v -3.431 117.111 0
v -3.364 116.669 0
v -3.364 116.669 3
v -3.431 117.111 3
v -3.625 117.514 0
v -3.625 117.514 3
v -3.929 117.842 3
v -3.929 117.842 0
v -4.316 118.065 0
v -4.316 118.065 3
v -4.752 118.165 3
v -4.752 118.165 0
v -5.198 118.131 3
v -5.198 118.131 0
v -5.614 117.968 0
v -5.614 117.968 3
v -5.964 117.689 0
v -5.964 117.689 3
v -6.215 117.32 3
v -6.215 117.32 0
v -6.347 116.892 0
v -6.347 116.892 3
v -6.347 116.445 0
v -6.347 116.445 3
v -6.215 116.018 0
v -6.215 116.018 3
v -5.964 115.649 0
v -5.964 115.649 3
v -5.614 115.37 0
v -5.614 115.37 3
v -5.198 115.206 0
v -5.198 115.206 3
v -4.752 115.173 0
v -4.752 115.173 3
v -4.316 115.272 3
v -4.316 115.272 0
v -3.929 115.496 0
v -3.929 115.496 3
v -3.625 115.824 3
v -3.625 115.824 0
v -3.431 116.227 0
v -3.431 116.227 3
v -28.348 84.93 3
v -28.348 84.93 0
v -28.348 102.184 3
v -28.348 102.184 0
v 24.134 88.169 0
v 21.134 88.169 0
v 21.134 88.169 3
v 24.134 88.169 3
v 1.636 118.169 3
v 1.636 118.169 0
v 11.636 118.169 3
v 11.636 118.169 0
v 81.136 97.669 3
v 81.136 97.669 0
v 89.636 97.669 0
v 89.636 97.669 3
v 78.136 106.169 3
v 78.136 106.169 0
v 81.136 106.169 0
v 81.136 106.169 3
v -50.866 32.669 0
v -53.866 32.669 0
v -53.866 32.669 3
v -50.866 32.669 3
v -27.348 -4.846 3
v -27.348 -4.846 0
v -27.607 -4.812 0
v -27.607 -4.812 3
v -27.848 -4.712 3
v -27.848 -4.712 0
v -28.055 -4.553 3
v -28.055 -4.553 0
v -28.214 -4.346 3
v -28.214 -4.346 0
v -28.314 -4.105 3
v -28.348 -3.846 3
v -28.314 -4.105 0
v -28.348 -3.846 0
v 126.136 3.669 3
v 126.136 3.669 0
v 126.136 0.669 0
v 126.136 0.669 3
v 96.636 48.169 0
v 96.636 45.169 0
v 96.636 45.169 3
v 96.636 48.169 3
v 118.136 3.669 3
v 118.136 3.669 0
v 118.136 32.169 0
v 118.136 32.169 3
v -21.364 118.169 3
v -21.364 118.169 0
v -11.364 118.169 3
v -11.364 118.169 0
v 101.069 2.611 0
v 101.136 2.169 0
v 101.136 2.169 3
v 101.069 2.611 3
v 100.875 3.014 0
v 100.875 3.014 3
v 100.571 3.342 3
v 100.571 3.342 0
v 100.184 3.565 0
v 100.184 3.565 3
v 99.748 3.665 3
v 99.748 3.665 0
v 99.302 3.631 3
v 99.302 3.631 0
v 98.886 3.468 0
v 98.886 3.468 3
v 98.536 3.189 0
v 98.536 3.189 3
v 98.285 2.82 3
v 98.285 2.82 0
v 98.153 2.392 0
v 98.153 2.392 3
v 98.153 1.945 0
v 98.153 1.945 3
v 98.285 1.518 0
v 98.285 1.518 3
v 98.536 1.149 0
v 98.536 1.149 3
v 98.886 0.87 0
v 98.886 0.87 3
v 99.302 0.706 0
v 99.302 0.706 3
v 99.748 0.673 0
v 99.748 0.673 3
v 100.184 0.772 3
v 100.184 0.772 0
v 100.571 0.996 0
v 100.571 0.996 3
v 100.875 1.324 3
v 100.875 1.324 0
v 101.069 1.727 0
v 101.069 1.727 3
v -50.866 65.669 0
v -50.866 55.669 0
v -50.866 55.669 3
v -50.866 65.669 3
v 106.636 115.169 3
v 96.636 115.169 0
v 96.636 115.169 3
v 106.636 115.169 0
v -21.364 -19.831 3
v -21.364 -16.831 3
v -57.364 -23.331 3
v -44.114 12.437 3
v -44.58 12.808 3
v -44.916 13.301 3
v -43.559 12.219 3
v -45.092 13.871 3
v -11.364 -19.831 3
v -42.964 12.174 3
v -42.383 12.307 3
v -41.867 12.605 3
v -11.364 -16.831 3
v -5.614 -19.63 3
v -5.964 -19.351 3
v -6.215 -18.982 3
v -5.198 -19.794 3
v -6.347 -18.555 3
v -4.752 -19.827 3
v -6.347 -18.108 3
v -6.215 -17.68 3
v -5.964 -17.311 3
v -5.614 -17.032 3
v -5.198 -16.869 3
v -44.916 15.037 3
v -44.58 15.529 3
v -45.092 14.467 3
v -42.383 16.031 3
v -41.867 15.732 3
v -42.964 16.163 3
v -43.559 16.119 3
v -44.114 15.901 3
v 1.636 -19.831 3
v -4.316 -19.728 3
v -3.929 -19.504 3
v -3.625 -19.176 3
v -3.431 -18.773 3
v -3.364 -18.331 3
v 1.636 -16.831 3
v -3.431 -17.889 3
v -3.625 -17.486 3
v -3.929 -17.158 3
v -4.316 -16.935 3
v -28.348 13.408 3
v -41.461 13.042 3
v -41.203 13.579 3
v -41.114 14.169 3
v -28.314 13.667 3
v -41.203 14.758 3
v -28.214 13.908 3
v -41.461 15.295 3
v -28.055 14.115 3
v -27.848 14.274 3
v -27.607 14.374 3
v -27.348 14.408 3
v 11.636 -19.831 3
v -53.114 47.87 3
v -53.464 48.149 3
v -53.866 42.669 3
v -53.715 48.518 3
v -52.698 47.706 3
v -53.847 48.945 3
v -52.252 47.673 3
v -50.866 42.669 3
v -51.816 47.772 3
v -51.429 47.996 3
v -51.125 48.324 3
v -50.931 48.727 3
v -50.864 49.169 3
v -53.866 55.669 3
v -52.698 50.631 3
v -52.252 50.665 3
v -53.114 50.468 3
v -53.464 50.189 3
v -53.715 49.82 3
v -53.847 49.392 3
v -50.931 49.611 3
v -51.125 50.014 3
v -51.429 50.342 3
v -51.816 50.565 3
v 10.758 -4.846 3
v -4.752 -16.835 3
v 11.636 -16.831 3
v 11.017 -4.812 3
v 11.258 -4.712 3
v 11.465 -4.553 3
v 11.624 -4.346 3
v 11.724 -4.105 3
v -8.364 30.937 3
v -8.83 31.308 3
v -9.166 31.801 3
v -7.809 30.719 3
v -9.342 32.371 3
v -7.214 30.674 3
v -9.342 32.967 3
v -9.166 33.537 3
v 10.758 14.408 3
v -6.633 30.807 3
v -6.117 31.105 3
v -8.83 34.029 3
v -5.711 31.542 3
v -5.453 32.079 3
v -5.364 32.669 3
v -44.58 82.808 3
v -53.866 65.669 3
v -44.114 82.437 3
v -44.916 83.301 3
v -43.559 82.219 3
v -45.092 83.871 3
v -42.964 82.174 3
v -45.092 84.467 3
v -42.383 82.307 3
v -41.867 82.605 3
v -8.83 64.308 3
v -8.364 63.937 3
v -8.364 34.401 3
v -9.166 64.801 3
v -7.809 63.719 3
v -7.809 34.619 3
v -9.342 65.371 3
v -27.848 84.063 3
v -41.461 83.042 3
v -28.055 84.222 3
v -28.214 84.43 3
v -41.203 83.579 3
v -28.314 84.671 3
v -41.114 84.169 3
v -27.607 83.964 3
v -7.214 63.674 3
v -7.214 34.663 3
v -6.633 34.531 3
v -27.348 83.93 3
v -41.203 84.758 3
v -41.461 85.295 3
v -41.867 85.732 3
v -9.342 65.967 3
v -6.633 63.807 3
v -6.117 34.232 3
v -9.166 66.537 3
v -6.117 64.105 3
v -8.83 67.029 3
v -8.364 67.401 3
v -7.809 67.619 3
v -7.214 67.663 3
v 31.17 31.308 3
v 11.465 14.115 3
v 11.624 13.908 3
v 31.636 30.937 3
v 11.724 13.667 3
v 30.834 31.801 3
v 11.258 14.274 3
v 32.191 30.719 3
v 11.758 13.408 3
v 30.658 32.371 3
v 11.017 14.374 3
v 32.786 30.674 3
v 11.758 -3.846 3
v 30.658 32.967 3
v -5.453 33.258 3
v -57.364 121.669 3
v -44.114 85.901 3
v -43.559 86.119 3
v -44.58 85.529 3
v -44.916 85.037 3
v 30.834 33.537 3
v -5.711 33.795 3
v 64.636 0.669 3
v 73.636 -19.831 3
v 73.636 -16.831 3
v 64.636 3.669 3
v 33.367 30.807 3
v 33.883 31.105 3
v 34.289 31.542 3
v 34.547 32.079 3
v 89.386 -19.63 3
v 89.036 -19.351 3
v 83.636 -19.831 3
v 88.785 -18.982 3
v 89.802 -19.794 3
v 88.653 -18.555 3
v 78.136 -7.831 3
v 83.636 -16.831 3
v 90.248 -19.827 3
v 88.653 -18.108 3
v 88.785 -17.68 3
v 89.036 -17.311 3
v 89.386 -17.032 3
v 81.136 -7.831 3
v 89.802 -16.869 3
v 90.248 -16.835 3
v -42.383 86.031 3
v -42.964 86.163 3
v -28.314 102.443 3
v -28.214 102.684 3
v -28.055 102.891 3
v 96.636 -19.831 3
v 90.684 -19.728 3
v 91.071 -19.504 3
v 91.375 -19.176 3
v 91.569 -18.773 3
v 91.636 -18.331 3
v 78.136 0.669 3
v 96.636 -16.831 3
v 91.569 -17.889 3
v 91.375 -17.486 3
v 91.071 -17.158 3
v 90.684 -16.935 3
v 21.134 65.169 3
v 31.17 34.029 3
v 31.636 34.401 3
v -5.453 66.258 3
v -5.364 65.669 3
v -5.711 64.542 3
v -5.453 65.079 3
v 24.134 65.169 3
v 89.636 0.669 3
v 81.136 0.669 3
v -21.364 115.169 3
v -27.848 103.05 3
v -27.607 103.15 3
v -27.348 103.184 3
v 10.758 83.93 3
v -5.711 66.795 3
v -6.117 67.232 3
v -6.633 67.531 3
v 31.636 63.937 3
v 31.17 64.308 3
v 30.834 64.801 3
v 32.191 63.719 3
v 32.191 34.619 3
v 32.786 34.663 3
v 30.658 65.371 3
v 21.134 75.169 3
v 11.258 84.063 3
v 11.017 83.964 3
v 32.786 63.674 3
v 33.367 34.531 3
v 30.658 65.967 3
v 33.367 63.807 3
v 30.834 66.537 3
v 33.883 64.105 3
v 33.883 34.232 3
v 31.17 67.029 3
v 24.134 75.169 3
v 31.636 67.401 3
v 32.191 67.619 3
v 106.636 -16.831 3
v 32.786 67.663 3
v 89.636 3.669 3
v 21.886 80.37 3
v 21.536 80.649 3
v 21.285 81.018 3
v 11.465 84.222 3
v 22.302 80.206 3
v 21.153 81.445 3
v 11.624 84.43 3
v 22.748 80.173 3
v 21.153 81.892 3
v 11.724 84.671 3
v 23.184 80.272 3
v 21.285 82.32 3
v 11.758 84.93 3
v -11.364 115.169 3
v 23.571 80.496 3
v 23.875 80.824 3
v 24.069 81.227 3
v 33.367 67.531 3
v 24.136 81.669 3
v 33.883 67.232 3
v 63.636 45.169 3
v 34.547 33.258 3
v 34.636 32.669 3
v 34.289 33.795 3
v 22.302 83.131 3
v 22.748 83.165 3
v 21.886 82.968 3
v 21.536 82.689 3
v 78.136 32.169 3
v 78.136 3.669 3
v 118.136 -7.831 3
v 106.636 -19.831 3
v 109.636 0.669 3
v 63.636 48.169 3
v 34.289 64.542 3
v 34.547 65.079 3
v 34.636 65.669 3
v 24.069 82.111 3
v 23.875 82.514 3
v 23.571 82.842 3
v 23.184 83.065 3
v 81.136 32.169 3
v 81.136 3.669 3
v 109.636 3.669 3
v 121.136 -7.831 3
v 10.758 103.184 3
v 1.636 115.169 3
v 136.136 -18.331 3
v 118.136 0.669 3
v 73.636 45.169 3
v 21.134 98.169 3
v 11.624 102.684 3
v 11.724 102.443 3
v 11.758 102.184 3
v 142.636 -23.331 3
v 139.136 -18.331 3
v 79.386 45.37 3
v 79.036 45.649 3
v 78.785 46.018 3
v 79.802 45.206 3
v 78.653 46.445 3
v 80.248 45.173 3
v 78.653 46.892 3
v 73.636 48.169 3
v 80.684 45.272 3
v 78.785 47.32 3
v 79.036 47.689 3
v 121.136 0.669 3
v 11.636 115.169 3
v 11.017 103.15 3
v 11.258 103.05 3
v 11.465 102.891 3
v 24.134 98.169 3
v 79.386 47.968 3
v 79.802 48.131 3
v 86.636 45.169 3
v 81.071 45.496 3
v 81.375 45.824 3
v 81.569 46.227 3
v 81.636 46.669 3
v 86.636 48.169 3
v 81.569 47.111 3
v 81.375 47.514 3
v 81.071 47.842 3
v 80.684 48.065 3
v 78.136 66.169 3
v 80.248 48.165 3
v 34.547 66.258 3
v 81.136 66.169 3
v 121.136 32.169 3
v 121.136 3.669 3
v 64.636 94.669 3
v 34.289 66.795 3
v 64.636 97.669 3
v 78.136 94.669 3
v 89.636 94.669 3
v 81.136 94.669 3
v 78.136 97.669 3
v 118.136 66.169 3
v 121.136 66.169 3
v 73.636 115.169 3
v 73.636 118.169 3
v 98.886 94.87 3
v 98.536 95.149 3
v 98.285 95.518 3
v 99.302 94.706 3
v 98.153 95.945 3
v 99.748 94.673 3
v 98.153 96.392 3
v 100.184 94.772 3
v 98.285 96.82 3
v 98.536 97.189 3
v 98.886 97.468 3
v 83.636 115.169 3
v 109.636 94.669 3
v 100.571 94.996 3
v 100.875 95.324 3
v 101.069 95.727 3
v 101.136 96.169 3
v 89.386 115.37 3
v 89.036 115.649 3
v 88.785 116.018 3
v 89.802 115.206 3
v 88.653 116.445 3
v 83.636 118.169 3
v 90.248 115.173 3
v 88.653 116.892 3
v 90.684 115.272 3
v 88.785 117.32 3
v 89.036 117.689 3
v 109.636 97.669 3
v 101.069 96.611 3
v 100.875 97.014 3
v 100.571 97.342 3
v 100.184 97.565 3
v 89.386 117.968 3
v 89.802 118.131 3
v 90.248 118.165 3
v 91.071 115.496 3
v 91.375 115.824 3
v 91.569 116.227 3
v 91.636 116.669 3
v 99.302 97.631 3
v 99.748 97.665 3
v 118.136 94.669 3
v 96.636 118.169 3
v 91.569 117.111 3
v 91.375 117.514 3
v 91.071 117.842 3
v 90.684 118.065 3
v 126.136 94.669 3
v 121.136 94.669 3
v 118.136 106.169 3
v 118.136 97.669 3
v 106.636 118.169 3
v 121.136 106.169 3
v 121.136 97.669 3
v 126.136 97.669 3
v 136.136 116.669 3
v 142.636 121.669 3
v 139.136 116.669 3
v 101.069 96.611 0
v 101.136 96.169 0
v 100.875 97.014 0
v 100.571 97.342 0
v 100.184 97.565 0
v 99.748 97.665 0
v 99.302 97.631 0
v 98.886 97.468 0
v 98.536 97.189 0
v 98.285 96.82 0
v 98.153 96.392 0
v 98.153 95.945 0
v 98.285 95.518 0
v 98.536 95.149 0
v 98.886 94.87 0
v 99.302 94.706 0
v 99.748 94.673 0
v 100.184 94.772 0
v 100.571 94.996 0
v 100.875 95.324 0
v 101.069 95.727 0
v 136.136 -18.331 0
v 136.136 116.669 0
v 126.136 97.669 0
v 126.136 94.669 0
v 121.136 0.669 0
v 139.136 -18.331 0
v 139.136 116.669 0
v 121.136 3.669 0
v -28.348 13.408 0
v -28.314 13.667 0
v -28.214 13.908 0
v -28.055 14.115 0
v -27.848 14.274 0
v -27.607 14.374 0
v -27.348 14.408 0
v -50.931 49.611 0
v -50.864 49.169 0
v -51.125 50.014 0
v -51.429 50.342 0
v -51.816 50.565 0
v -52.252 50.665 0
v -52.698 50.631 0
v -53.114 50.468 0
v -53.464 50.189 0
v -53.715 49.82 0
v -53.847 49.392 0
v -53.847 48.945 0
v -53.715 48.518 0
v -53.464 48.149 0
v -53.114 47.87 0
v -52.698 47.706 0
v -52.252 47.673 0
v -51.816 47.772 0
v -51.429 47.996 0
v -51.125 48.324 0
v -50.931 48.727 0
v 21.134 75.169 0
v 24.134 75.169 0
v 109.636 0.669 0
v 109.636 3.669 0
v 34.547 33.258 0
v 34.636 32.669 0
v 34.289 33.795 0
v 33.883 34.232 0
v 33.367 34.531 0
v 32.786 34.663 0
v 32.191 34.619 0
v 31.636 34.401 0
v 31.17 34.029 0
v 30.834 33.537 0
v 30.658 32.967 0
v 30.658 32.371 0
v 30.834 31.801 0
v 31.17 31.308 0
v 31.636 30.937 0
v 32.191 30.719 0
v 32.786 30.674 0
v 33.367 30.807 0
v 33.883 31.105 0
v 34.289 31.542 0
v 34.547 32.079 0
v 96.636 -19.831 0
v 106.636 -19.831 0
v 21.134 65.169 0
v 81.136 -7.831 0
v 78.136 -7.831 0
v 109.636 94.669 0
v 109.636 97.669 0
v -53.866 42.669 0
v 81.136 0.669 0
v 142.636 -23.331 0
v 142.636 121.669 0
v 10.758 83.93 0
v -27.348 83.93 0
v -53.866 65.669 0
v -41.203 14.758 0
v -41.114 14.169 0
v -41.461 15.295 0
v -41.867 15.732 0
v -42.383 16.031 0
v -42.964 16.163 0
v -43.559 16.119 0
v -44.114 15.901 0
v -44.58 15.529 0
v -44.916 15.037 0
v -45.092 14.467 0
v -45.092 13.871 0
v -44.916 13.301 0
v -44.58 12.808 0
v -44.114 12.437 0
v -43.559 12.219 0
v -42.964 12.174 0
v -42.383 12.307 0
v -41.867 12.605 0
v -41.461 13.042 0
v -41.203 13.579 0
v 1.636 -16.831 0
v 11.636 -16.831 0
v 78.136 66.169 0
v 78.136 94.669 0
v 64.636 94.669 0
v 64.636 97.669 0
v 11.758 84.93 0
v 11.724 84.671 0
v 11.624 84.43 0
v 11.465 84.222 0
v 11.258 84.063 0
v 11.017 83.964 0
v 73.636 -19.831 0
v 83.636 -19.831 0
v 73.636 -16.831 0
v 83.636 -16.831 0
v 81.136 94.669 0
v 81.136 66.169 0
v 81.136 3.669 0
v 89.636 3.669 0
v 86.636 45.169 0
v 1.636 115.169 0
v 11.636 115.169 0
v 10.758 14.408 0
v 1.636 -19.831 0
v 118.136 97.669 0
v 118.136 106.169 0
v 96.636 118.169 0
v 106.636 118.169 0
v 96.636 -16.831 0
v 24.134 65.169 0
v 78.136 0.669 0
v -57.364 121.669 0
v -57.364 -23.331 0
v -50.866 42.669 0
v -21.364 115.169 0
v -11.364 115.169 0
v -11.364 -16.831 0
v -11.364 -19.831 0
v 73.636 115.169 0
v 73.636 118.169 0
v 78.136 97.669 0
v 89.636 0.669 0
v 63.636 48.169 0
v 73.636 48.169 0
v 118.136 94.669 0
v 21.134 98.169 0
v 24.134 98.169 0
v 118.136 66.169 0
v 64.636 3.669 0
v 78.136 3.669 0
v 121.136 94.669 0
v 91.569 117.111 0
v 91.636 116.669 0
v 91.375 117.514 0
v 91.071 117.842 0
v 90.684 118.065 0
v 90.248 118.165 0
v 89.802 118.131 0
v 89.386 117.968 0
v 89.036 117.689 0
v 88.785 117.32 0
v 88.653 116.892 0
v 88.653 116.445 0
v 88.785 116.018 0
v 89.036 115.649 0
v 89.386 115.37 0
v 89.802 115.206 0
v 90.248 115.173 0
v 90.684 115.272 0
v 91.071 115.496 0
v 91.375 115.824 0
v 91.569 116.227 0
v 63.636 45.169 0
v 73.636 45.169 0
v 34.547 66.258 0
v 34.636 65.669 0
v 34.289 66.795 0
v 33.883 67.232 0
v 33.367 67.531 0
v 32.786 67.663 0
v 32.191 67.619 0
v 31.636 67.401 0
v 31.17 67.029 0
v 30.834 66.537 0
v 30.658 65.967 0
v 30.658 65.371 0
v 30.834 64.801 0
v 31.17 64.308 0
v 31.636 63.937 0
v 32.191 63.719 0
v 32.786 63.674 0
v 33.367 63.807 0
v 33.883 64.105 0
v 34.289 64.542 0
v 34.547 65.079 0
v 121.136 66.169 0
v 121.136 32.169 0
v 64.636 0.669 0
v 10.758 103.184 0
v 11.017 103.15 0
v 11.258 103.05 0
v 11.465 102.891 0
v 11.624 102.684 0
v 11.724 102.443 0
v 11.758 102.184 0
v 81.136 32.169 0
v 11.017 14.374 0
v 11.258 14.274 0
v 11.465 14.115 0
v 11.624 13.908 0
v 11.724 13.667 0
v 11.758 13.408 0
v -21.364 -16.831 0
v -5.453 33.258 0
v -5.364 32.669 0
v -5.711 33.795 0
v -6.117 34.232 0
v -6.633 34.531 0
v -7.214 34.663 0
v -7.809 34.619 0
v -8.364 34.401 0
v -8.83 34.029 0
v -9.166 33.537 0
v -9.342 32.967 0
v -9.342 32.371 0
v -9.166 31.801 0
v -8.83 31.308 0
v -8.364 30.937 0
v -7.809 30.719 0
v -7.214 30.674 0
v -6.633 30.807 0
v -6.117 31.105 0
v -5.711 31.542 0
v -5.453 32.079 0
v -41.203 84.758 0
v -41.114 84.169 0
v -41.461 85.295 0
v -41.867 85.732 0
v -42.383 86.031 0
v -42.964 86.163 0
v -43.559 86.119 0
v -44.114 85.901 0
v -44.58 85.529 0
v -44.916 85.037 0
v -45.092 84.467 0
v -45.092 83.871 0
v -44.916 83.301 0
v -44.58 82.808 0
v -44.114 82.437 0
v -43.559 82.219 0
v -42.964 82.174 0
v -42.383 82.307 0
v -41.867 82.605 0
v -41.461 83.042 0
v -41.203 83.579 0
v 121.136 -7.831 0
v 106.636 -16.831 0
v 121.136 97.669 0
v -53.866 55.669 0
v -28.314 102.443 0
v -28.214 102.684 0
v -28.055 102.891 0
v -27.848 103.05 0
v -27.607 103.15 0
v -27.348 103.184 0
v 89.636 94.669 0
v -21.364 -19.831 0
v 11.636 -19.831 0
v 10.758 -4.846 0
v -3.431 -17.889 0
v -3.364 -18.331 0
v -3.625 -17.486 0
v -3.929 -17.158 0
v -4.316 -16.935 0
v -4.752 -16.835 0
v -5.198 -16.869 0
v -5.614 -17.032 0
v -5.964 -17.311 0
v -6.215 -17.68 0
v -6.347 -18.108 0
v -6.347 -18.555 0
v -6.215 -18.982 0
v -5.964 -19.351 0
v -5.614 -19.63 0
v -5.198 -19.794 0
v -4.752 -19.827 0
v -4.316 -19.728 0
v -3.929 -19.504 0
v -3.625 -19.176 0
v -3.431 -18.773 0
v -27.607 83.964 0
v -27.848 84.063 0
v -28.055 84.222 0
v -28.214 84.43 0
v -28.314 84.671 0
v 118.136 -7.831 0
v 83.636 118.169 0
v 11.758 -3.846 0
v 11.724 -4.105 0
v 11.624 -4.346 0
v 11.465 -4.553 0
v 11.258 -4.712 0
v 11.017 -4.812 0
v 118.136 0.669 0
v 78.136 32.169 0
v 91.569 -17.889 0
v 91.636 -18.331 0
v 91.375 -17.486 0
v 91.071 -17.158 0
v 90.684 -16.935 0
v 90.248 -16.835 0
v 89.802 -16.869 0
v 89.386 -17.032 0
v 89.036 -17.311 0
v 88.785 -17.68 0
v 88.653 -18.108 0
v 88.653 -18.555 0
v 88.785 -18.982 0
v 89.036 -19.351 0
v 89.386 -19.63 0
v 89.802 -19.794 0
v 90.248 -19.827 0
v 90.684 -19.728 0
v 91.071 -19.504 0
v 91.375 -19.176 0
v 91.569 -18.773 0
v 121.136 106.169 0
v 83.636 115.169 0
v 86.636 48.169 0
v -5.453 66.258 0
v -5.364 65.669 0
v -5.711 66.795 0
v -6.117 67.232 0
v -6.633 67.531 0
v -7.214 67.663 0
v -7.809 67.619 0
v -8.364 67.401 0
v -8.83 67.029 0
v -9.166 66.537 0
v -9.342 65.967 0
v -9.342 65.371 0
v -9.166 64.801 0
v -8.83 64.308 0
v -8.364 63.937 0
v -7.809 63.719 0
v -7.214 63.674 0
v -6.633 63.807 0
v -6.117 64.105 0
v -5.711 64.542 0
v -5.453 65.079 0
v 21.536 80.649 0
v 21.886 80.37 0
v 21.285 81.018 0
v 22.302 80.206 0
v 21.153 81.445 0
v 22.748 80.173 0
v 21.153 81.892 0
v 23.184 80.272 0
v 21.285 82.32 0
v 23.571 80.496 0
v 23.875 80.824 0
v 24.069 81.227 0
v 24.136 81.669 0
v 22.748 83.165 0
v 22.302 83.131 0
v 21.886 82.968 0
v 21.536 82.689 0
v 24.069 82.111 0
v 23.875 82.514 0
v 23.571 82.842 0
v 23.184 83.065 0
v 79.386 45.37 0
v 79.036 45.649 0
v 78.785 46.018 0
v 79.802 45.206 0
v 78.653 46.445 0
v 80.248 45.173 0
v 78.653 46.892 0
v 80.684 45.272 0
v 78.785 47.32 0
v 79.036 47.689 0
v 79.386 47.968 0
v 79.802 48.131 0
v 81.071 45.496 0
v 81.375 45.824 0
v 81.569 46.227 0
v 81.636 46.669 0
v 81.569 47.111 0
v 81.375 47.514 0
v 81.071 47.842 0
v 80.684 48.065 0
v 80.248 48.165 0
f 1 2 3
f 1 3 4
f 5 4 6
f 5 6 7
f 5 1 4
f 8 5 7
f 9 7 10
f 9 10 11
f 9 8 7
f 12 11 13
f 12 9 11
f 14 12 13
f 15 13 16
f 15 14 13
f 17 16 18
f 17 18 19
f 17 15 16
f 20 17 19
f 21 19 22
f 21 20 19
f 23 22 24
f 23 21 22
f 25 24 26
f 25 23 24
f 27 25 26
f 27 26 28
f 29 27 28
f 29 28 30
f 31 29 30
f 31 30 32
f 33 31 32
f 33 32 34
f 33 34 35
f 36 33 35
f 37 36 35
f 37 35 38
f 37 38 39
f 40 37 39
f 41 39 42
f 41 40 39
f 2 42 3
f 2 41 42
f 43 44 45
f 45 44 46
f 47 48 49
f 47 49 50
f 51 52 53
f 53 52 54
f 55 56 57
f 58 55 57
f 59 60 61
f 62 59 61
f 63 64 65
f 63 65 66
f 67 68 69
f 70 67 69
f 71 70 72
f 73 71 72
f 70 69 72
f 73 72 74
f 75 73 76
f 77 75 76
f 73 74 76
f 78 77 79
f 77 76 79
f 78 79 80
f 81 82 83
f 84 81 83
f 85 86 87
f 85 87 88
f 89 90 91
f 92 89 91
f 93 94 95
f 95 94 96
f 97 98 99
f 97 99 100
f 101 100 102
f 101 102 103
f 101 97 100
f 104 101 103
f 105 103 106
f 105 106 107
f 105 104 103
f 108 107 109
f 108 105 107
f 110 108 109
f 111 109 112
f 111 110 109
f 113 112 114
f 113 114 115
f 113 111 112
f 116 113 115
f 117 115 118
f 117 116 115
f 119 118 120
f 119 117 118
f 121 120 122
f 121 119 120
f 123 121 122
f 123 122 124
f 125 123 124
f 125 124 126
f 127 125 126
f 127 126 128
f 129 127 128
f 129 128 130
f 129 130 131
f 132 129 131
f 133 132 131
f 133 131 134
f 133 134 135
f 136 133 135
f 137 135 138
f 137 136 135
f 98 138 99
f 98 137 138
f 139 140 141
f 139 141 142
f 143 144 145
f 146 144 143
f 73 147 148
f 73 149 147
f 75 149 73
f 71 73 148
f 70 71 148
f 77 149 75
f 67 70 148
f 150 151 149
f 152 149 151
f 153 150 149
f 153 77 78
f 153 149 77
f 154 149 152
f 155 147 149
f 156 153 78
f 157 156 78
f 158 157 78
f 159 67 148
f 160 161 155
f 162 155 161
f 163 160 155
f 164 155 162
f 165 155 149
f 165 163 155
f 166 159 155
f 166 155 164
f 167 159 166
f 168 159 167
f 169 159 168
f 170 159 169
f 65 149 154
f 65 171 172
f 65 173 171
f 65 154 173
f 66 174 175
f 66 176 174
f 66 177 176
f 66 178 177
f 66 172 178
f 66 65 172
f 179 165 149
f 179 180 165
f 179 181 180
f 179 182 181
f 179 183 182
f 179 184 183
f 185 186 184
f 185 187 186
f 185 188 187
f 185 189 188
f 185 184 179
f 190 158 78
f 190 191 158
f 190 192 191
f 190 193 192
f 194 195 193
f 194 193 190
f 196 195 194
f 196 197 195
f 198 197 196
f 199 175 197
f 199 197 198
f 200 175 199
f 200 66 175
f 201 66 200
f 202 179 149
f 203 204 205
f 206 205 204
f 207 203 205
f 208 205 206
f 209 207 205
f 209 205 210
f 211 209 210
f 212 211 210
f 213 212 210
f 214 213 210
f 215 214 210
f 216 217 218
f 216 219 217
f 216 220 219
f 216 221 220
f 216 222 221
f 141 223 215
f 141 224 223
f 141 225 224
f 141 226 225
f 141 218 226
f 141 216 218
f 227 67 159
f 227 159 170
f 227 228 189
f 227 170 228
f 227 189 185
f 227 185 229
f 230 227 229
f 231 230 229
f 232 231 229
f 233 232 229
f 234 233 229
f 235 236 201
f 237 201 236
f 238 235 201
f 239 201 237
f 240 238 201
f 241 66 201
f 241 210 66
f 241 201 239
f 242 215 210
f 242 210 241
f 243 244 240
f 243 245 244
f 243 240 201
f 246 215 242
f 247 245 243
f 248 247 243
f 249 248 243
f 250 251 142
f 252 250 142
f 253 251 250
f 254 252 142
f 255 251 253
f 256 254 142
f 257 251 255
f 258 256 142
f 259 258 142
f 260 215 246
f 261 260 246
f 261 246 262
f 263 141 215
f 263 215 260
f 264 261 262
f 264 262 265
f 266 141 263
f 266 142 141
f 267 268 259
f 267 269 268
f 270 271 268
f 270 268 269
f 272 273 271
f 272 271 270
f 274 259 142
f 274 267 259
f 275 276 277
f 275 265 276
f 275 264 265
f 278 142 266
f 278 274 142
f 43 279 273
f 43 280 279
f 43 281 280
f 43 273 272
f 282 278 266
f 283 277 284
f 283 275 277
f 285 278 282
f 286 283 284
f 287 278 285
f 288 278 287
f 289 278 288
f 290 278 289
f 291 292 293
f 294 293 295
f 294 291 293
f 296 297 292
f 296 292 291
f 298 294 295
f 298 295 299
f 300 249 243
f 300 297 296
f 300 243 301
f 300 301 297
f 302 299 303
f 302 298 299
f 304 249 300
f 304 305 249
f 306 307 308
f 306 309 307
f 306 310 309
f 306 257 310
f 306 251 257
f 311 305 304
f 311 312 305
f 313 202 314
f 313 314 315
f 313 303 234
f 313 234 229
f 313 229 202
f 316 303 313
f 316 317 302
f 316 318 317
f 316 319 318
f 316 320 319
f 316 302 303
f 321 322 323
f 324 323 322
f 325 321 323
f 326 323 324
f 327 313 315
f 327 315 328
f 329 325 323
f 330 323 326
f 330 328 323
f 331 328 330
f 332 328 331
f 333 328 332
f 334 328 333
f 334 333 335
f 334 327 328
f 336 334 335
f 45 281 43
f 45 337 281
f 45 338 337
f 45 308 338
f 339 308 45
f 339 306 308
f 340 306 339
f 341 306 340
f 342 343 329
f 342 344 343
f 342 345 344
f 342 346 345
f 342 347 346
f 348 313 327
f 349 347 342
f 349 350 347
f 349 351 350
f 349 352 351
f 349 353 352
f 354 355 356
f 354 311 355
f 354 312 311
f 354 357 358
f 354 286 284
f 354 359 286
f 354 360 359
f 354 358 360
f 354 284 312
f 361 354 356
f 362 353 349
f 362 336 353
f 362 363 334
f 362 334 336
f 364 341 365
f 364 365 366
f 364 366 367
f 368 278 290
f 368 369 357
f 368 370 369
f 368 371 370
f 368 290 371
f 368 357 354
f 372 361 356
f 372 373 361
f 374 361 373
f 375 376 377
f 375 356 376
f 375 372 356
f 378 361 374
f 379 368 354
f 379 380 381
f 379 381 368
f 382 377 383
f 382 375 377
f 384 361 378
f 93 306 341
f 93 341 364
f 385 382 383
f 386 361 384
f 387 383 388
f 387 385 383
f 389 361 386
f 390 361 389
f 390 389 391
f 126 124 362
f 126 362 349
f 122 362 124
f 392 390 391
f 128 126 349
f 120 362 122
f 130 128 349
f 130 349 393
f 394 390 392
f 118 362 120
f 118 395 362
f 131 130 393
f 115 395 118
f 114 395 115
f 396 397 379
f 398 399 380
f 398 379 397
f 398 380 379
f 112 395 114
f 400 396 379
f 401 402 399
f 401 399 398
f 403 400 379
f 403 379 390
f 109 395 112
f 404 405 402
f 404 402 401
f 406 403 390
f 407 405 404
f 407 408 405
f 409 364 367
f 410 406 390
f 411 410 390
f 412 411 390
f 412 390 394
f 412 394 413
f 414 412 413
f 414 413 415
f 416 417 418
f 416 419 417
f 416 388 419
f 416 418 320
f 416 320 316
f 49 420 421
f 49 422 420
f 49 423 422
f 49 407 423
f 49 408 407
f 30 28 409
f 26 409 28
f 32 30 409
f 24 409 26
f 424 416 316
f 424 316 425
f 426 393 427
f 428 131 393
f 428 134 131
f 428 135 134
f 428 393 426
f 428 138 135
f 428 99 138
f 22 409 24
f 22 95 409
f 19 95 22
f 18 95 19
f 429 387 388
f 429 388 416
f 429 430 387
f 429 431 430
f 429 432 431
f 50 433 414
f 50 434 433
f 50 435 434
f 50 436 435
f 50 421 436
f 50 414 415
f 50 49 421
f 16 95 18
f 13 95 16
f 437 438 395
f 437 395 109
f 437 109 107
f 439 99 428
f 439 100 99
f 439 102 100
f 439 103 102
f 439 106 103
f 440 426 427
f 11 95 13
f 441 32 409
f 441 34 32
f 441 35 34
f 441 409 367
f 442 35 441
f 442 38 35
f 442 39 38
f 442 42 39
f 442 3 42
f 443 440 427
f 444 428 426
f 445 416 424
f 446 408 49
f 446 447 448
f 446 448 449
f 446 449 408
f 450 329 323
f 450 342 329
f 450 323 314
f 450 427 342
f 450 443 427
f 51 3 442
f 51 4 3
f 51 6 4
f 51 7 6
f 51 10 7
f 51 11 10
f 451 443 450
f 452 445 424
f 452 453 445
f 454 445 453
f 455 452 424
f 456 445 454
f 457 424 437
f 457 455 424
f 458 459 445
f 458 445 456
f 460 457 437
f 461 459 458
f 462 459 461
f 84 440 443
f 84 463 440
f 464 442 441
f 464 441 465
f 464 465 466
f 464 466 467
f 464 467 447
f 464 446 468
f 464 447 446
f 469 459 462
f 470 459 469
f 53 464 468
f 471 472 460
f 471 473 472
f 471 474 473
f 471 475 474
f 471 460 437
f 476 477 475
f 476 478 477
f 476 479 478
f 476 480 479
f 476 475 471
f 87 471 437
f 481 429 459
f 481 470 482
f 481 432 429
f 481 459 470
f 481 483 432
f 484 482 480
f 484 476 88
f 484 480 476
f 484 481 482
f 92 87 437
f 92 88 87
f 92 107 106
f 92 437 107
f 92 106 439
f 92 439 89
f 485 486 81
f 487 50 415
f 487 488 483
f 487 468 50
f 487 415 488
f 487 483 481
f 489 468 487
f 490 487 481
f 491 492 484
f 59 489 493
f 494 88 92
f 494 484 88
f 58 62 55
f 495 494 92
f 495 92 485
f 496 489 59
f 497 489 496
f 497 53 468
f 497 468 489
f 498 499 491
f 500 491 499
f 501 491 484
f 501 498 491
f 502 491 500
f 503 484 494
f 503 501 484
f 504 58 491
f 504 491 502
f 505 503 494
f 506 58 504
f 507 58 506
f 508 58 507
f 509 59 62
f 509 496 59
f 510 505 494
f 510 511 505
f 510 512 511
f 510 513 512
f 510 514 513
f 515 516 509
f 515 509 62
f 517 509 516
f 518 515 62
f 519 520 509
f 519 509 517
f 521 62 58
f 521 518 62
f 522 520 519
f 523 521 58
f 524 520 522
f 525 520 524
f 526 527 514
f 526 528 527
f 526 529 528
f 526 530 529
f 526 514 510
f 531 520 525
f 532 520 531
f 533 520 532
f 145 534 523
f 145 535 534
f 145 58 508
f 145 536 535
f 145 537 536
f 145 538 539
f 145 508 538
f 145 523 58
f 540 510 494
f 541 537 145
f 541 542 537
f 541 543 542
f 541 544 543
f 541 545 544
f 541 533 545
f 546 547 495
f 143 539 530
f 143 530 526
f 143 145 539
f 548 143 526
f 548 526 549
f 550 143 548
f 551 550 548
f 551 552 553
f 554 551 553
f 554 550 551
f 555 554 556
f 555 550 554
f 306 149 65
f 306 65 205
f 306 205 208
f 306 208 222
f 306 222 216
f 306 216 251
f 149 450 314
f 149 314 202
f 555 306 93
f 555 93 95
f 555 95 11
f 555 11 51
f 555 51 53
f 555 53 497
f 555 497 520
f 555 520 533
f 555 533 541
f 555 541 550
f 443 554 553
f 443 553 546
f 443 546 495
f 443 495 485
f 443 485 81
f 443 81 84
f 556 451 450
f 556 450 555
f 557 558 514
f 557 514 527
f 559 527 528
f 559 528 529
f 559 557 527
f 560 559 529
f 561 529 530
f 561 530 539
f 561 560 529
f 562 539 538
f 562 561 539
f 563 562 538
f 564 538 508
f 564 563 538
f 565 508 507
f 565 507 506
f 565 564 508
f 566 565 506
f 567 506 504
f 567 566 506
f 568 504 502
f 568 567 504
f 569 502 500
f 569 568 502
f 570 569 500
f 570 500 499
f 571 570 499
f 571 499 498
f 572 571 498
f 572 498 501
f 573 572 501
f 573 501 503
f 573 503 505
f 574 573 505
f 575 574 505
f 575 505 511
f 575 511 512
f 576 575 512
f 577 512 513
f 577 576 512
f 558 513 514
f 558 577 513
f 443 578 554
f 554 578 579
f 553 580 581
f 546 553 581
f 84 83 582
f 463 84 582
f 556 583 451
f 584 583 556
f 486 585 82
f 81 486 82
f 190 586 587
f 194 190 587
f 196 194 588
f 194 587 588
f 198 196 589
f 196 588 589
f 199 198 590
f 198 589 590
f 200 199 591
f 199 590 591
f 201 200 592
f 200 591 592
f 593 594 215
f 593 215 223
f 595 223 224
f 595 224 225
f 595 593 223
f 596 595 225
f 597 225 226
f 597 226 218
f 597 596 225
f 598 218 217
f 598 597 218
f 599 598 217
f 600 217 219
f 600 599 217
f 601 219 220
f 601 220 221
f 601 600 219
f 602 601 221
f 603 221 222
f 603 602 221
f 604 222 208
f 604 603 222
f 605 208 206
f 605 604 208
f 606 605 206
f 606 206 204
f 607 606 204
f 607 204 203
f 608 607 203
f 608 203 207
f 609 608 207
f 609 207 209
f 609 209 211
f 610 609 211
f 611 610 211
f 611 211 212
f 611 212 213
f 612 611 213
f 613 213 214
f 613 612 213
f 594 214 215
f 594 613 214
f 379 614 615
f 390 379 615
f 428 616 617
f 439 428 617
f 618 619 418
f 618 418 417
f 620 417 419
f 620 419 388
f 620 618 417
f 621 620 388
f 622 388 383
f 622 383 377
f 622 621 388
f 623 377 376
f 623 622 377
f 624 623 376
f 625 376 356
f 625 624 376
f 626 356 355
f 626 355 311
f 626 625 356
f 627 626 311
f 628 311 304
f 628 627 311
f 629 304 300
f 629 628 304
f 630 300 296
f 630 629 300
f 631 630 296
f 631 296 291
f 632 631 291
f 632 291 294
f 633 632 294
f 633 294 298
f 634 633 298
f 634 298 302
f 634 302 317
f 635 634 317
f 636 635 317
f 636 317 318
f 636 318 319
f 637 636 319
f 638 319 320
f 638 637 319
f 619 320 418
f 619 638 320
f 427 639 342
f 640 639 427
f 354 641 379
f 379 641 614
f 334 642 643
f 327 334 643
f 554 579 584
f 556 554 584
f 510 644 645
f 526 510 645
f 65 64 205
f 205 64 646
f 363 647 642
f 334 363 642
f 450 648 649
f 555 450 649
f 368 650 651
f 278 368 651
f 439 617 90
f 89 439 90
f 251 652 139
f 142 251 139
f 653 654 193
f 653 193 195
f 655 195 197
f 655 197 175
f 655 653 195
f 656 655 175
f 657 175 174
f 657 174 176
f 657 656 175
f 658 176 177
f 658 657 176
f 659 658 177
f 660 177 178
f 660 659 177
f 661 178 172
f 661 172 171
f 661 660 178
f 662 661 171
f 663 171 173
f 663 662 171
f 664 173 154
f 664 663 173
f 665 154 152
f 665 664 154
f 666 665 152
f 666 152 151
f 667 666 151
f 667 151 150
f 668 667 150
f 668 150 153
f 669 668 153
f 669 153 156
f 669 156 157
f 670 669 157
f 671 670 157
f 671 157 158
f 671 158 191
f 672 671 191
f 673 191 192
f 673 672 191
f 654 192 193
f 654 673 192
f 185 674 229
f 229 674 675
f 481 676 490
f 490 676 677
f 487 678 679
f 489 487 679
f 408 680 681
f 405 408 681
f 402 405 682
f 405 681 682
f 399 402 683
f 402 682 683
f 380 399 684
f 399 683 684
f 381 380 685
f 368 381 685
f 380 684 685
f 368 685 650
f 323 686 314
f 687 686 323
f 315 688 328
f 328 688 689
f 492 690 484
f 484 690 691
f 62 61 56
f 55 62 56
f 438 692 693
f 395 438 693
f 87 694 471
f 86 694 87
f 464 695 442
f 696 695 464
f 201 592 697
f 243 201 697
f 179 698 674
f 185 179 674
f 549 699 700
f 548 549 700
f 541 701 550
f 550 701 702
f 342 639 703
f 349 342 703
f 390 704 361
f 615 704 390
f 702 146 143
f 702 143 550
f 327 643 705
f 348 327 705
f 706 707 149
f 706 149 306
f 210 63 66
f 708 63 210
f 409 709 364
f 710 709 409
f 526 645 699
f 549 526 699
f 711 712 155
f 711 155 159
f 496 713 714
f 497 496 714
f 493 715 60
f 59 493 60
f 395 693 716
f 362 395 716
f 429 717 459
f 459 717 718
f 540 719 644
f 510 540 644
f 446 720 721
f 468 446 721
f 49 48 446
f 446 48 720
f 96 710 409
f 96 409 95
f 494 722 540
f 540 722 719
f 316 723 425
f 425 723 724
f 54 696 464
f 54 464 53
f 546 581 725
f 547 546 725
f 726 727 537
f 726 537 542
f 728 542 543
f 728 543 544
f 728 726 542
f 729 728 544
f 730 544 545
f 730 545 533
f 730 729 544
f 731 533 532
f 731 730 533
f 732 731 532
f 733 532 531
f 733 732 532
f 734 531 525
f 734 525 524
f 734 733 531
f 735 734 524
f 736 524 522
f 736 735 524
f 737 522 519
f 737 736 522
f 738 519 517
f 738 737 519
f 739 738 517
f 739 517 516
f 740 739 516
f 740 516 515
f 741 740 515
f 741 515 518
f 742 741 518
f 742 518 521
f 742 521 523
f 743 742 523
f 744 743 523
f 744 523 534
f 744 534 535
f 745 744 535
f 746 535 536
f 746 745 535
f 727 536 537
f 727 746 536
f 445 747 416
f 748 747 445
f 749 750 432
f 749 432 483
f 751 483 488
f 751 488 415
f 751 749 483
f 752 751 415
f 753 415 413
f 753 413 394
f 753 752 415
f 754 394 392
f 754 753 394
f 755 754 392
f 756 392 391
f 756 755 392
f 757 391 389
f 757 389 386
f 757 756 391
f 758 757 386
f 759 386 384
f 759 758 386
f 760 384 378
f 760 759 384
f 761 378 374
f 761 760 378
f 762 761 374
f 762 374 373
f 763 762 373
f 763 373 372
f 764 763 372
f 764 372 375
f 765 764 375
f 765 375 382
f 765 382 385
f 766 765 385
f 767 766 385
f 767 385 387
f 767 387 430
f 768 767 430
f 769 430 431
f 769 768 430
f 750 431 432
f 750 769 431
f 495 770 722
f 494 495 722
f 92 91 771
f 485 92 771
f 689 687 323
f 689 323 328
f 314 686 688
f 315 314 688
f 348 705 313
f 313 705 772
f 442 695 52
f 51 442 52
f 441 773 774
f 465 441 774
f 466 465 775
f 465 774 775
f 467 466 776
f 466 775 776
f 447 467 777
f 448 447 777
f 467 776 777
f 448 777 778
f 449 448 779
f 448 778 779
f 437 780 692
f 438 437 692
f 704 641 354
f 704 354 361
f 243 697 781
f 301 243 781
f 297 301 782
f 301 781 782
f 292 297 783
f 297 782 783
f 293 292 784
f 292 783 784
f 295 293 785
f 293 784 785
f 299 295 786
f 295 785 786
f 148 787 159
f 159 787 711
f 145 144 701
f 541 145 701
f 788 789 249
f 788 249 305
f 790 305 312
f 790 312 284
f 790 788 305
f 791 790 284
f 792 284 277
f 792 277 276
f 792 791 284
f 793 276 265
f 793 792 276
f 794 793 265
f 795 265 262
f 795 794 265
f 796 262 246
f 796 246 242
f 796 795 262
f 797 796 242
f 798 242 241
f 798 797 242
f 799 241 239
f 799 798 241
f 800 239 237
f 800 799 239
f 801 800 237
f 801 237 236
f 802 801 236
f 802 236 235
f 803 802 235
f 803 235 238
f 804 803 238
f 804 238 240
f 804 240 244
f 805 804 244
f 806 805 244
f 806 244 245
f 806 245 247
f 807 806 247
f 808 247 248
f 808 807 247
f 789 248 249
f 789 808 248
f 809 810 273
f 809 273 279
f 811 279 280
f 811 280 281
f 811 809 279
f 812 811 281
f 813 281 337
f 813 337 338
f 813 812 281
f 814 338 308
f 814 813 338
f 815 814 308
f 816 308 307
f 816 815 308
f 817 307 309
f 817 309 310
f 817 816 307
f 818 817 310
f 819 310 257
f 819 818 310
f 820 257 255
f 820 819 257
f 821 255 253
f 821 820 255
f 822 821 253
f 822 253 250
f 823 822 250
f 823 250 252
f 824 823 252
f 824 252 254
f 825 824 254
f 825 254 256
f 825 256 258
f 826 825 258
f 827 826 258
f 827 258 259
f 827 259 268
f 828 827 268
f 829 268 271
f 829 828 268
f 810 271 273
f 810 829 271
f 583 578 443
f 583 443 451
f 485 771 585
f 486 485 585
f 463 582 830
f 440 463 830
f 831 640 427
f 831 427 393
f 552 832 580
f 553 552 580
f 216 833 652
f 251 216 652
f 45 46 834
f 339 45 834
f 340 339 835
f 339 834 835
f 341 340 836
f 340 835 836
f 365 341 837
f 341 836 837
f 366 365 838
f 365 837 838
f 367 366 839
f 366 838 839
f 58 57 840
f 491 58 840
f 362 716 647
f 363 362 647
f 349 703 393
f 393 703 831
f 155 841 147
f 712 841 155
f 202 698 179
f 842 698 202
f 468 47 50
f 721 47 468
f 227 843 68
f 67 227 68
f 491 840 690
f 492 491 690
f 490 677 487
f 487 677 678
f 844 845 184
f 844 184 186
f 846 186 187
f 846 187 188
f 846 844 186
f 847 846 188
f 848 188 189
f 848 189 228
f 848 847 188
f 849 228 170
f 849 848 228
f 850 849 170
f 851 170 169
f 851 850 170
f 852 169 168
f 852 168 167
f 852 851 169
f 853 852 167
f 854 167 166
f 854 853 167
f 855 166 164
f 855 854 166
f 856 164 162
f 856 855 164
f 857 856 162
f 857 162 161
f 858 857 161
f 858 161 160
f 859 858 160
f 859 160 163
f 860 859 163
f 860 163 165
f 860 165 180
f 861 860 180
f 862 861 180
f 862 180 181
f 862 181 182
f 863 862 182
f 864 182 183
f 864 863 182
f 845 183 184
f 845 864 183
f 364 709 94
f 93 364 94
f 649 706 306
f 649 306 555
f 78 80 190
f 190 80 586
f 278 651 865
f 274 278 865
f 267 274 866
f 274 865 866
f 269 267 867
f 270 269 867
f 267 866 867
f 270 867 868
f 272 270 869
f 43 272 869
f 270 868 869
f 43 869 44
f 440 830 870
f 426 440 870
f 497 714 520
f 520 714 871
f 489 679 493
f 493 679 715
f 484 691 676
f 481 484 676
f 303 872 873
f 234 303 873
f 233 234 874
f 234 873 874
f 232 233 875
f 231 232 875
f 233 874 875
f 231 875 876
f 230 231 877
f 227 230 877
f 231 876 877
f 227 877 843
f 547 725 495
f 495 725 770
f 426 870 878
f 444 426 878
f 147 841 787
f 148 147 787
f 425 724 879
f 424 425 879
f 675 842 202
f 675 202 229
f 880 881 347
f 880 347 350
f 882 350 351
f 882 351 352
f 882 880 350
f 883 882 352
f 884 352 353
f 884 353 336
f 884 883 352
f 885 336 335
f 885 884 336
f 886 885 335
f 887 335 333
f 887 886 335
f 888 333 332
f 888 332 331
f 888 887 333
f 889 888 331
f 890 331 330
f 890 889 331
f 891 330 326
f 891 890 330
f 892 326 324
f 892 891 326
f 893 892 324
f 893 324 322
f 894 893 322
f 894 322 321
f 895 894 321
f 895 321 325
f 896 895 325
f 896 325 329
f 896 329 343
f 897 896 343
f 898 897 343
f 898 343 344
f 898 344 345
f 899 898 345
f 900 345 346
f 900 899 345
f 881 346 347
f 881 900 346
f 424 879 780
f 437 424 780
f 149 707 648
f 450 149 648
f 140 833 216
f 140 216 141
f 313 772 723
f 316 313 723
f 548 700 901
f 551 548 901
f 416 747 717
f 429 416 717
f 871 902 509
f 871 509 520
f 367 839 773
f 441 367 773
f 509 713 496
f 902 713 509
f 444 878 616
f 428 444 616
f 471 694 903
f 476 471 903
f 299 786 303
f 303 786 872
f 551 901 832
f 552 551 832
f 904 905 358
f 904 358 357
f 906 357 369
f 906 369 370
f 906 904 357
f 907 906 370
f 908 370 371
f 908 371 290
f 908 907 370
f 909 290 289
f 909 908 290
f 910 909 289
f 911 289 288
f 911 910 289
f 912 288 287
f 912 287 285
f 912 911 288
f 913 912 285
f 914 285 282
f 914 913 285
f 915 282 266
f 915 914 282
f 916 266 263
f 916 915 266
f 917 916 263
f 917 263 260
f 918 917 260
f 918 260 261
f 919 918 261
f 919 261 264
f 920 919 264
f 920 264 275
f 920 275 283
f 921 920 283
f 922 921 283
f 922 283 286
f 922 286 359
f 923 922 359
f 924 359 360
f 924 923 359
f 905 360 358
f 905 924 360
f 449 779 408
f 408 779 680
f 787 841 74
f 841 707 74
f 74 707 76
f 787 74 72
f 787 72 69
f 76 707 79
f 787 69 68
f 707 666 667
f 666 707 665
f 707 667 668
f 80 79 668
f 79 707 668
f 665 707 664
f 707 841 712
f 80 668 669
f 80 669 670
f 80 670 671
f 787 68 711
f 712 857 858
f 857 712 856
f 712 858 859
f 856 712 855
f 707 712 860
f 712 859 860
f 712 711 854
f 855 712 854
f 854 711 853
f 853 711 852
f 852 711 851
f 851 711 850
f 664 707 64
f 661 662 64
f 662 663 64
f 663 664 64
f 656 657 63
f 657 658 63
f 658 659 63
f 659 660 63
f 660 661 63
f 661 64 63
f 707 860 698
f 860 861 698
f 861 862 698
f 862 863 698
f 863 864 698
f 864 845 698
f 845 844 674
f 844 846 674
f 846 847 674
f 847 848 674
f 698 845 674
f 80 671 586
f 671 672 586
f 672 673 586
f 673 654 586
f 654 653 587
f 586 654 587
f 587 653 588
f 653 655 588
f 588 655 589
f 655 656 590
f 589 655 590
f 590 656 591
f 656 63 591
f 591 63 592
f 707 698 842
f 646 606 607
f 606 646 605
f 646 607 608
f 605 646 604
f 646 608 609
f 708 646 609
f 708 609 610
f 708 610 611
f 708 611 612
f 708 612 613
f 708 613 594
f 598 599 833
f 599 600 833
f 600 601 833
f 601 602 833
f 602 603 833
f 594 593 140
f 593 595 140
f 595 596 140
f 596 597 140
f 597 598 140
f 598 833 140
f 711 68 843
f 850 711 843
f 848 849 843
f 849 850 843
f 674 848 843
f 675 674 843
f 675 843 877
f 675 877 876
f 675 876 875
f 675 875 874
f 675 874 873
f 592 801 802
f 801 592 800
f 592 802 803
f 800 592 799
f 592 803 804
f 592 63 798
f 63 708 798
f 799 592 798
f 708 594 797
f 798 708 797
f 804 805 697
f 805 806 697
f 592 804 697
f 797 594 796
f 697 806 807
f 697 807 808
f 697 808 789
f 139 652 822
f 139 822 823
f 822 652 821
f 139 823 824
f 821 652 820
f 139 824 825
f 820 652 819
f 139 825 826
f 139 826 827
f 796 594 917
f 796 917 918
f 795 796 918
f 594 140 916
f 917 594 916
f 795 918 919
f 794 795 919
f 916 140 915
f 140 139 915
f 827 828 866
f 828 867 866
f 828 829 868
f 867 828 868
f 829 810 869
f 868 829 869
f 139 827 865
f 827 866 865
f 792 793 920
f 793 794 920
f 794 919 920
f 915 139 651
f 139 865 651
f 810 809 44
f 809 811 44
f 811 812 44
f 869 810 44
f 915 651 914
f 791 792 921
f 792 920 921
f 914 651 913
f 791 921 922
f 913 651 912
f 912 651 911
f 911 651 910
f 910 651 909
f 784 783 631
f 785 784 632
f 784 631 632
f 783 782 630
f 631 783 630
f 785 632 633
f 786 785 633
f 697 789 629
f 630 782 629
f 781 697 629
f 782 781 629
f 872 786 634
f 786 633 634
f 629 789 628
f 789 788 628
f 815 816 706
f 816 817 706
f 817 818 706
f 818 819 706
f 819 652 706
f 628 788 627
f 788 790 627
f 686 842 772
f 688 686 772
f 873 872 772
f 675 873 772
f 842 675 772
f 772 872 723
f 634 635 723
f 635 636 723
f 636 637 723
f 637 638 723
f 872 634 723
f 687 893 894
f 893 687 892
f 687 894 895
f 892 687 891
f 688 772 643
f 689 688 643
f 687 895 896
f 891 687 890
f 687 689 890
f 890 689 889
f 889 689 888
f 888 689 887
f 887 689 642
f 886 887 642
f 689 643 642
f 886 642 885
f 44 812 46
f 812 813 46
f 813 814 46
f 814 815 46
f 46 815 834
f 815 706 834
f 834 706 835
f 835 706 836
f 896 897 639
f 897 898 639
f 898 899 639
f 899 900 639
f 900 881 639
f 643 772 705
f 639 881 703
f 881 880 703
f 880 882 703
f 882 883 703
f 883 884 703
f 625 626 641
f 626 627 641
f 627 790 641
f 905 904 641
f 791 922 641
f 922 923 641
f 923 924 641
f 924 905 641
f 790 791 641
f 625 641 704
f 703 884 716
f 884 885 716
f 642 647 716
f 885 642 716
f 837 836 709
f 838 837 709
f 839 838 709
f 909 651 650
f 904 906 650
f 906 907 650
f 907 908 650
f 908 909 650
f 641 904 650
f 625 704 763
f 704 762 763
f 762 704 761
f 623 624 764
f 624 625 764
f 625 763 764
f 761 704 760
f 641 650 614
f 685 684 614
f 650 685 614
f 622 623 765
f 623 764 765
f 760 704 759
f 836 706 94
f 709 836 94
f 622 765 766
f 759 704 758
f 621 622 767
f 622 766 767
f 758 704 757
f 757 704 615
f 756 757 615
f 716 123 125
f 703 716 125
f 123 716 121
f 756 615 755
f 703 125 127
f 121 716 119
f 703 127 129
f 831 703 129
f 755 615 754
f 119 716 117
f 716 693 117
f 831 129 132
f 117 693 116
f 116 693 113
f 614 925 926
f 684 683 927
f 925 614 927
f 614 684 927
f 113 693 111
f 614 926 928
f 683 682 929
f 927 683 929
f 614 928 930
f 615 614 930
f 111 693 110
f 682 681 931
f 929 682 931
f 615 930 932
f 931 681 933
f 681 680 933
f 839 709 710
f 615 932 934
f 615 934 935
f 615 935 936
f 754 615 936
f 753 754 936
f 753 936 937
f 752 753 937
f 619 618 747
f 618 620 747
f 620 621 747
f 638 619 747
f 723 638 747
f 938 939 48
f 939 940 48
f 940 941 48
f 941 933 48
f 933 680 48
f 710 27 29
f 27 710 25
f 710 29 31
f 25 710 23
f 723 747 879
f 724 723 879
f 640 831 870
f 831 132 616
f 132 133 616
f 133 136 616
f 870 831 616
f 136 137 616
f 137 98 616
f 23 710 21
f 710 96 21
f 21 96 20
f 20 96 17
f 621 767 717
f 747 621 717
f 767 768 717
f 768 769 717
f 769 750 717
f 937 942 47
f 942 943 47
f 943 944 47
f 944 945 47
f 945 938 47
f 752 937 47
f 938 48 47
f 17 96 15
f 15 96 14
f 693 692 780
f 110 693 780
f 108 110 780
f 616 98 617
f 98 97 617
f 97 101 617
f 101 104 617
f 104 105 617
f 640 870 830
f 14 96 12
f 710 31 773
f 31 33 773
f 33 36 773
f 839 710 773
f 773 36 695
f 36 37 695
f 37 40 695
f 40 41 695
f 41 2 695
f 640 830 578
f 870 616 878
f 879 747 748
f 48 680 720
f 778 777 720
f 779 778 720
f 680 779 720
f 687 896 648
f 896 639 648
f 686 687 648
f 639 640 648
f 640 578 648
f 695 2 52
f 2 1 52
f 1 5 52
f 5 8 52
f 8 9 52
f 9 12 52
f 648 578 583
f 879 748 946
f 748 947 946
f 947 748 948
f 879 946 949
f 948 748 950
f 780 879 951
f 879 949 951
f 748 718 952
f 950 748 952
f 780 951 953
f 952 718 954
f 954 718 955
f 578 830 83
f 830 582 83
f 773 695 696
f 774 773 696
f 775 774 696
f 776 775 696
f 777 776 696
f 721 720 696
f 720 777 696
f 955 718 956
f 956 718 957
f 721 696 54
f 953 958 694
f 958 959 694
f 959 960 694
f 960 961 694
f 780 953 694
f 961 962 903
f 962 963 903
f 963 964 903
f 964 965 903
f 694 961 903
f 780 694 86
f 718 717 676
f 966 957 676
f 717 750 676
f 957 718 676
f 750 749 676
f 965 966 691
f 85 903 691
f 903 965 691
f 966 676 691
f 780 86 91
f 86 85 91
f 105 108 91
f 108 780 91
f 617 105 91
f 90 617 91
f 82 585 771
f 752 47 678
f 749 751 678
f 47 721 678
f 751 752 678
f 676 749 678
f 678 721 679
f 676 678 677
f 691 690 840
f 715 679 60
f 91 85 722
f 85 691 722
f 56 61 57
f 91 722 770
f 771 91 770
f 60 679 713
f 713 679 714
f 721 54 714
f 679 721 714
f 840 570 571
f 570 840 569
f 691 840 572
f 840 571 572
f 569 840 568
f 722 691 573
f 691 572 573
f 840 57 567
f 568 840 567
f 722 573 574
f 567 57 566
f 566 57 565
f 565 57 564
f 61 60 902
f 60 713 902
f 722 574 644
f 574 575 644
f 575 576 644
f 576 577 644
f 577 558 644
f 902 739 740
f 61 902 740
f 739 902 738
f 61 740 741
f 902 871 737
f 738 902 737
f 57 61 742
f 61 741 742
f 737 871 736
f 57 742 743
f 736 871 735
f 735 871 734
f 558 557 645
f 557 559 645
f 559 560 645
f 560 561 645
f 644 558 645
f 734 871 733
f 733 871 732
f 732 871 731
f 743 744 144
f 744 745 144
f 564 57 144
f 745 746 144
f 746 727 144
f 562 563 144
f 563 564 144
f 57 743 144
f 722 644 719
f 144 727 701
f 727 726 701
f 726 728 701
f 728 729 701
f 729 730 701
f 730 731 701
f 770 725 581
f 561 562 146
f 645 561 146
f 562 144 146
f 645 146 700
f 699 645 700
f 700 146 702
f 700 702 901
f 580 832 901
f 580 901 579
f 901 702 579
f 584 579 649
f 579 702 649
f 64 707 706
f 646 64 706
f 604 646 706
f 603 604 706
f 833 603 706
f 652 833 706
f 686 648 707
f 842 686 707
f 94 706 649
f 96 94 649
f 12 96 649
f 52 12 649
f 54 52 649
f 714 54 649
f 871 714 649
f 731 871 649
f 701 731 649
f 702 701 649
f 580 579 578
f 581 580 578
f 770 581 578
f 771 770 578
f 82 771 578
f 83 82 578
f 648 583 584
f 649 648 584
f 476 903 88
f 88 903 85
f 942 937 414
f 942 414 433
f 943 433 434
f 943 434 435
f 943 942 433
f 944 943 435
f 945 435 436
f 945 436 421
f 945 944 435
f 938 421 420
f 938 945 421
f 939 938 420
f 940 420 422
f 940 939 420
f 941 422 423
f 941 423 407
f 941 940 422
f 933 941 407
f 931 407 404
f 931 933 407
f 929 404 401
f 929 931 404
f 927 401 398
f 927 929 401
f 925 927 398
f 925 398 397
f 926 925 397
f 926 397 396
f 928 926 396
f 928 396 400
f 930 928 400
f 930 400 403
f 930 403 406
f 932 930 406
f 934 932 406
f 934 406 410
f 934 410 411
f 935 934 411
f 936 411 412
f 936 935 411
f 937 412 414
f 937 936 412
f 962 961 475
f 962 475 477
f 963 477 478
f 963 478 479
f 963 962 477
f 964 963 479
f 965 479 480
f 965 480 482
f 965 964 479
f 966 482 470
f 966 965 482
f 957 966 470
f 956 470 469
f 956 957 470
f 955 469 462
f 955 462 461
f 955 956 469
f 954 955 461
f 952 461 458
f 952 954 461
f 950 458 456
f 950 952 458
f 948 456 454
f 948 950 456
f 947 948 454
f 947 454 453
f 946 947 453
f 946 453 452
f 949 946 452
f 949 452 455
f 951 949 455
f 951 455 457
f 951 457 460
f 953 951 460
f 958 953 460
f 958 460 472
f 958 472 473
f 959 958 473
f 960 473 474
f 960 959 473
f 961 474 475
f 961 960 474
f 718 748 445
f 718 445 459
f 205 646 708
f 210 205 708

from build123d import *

# Parameters (mm, degrees)
F0_W     = 200
F0_H     = 145
F0_R     = 2
F0_W_2   = 10
F0_H_2   = 3
F0_R_2   = 1.5
F0_W_3   = 3
F0_H_3   = 10
F0_H_4   = 135
F1_DEPTH = 3


with BuildPart() as f1:
    # F0 (on Top) → F1 (new body)
    with BuildSketch(Plane.XY):
        with Locations((42.636041, 49.168777)):
            Rectangle(F0_W, F0_H)
        with Locations((-43.113959, 14.168777)):
            Circle(F0_R, mode=Mode.SUBTRACT)
        with Locations((-16.363959, -18.331223)):
            Rectangle(F0_W_2, F0_H_2, mode=Mode.SUBTRACT)
        with Locations((-4.863959, -18.331223)):
            Circle(F0_R_2, mode=Mode.SUBTRACT)
        with Locations((6.636041, -18.331223)):
            Rectangle(F0_W_2, F0_H_2, mode=Mode.SUBTRACT)
        with BuildLine():
            ThreePointArc((-28.34783, 13.408052), (-28.054936, 14.115159), (-27.34783, 14.408052))
            Line((-27.34783, 14.408052), (10.75808, 14.408052))
            ThreePointArc((10.75808, 14.408052), (11.465186, 14.115159), (11.75808, 13.408052))
            Line((11.75808, 13.408052), (11.75808, -3.846393))
            ThreePointArc((11.75808, -3.846393), (11.465186, -4.553499), (10.75808, -4.846393))
            Line((10.75808, -4.846393), (-27.34783, -4.846393))
            ThreePointArc((-27.34783, -4.846393), (-28.054936, -4.553499), (-28.34783, -3.846393))
            Line((-28.34783, -3.846393), (-28.34783, 13.408052))
        make_face(mode=Mode.SUBTRACT)
        with Locations((-52.365544, 37.668777)):
            Rectangle(F0_W_3, F0_H_3, mode=Mode.SUBTRACT)
        with Locations((-52.363959, 49.168777)):
            Circle(F0_R_2, mode=Mode.SUBTRACT)
        with Locations((-7.363959, 32.668777)):
            Circle(F0_R, mode=Mode.SUBTRACT)
        with Locations((78.636041, -18.331223)):
            Rectangle(F0_W_2, F0_H_2, mode=Mode.SUBTRACT)
        with Locations((90.136041, -18.331223)):
            Circle(F0_R_2, mode=Mode.SUBTRACT)
        Polygon((78.136041, 32.168777), (81.136041, 32.168777), (81.136041, 3.668777), (89.636041, 3.668777), (89.636041, 0.668777), (81.136041, 0.668777), (81.136041, -7.831223), (78.136041, -7.831223), (78.136041, 0.668777), (64.636041, 0.668777), (64.636041, 3.668777), (78.136041, 3.668777), align=None, mode=Mode.SUBTRACT)
        with Locations((32.636041, 32.668777)):
            Circle(F0_R, mode=Mode.SUBTRACT)
        with Locations((68.636041, 46.668777)):
            Rectangle(F0_W_2, F0_H_2, mode=Mode.SUBTRACT)
        with Locations((80.136041, 46.668777)):
            Circle(F0_R_2, mode=Mode.SUBTRACT)
        with Locations((-52.365544, 60.668777)):
            Rectangle(F0_W_3, F0_H_3, mode=Mode.SUBTRACT)
        with Locations((-43.113959, 84.168777)):
            Circle(F0_R, mode=Mode.SUBTRACT)
        with Locations((-7.363959, 65.668777)):
            Circle(F0_R, mode=Mode.SUBTRACT)
        with BuildLine():
            Line((-27.34783, 103.183946), (10.75808, 103.183946))
            ThreePointArc((10.75808, 103.183946), (11.465186, 102.891053), (11.75808, 102.183946))
            Line((11.75808, 102.183946), (11.75808, 84.929501))
            ThreePointArc((11.75808, 84.929501), (11.465186, 84.222394), (10.75808, 83.929501))
            Line((10.75808, 83.929501), (-27.34783, 83.929501))
            ThreePointArc((-27.34783, 83.929501), (-28.054936, 84.222394), (-28.34783, 84.929501))
            Line((-28.34783, 84.929501), (-28.34783, 102.183946))
            ThreePointArc((-28.34783, 102.183946), (-28.054936, 102.891053), (-27.34783, 103.183946))
        make_face(mode=Mode.SUBTRACT)
        with Locations((-16.363959, 116.668777)):
            Rectangle(F0_W_2, F0_H_2, mode=Mode.SUBTRACT)
        with Locations((-4.863959, 116.668777)):
            Circle(F0_R_2, mode=Mode.SUBTRACT)
        with Locations((6.636041, 116.668777)):
            Rectangle(F0_W_2, F0_H_2, mode=Mode.SUBTRACT)
        with Locations((22.634456, 70.168777)):
            Rectangle(F0_W_3, F0_H_3, mode=Mode.SUBTRACT)
        with Locations((32.636041, 65.668777)):
            Circle(F0_R, mode=Mode.SUBTRACT)
        with Locations((22.636041, 81.668777)):
            Circle(F0_R_2, mode=Mode.SUBTRACT)
        Polygon((81.136041, 94.668777), (81.136041, 66.168777), (78.136041, 66.168777), (78.136041, 94.668777), (64.636041, 94.668777), (64.636041, 97.668777), (78.136041, 97.668777), (78.136041, 106.168777), (81.136041, 106.168777), (81.136041, 97.668777), (89.636041, 97.668777), (89.636041, 94.668777), align=None, mode=Mode.SUBTRACT)
        with Locations((22.634456, 93.168777)):
            Rectangle(F0_W_3, F0_H_3, mode=Mode.SUBTRACT)
        with Locations((78.636041, 116.668777)):
            Rectangle(F0_W_2, F0_H_2, mode=Mode.SUBTRACT)
        with Locations((90.136041, 116.668777)):
            Circle(F0_R_2, mode=Mode.SUBTRACT)
        with Locations((101.636041, -18.331223)):
            Rectangle(F0_W_2, F0_H_2, mode=Mode.SUBTRACT)
        with Locations((99.636041, 2.168777)):
            Circle(F0_R_2, mode=Mode.SUBTRACT)
        Polygon((118.136041, 3.668777), (118.136041, 32.168777), (121.136041, 32.168777), (121.136041, 3.668777), (126.136041, 3.668777), (126.136041, 0.668777), (121.136041, 0.668777), (121.136041, -7.831223), (118.136041, -7.831223), (118.136041, 0.668777), (109.636041, 0.668777), (109.636041, 3.668777), align=None, mode=Mode.SUBTRACT)
        with Locations((91.636041, 46.668777)):
            Rectangle(F0_W_2, F0_H_2, mode=Mode.SUBTRACT)
        with Locations((137.636041, 49.168777)):
            Rectangle(F0_W_3, F0_H_4, mode=Mode.SUBTRACT)
        Polygon((118.136041, 97.668777), (118.136041, 106.168777), (121.136041, 106.168777), (121.136041, 97.668777), (126.136041, 97.668777), (126.136041, 94.668777), (121.136041, 94.668777), (121.136041, 66.168777), (118.136041, 66.168777), (118.136041, 94.668777), (109.636041, 94.668777), (109.636041, 97.668777), align=None, mode=Mode.SUBTRACT)
        with Locations((99.636041, 96.168777)):
            Circle(F0_R_2, mode=Mode.SUBTRACT)
        with Locations((101.636041, 116.668777)):
            Rectangle(F0_W_2, F0_H_2, mode=Mode.SUBTRACT)
    extrude(amount=F1_DEPTH)


solid = f1.part
